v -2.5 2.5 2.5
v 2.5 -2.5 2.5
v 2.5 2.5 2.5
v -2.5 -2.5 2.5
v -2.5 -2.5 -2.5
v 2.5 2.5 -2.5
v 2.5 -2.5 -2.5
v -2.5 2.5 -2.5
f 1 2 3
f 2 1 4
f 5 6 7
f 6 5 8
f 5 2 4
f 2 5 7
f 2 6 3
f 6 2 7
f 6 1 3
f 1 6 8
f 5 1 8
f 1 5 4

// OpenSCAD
// Generated by Mecha (https://github.com/tomahawkins/mecha)

color([0.5, 0.5, 0.5, 1.0]) translate ([-2.5, -2.5, -2.5]) cube(size = [5.0, 5.0, 5.0], center = false);
